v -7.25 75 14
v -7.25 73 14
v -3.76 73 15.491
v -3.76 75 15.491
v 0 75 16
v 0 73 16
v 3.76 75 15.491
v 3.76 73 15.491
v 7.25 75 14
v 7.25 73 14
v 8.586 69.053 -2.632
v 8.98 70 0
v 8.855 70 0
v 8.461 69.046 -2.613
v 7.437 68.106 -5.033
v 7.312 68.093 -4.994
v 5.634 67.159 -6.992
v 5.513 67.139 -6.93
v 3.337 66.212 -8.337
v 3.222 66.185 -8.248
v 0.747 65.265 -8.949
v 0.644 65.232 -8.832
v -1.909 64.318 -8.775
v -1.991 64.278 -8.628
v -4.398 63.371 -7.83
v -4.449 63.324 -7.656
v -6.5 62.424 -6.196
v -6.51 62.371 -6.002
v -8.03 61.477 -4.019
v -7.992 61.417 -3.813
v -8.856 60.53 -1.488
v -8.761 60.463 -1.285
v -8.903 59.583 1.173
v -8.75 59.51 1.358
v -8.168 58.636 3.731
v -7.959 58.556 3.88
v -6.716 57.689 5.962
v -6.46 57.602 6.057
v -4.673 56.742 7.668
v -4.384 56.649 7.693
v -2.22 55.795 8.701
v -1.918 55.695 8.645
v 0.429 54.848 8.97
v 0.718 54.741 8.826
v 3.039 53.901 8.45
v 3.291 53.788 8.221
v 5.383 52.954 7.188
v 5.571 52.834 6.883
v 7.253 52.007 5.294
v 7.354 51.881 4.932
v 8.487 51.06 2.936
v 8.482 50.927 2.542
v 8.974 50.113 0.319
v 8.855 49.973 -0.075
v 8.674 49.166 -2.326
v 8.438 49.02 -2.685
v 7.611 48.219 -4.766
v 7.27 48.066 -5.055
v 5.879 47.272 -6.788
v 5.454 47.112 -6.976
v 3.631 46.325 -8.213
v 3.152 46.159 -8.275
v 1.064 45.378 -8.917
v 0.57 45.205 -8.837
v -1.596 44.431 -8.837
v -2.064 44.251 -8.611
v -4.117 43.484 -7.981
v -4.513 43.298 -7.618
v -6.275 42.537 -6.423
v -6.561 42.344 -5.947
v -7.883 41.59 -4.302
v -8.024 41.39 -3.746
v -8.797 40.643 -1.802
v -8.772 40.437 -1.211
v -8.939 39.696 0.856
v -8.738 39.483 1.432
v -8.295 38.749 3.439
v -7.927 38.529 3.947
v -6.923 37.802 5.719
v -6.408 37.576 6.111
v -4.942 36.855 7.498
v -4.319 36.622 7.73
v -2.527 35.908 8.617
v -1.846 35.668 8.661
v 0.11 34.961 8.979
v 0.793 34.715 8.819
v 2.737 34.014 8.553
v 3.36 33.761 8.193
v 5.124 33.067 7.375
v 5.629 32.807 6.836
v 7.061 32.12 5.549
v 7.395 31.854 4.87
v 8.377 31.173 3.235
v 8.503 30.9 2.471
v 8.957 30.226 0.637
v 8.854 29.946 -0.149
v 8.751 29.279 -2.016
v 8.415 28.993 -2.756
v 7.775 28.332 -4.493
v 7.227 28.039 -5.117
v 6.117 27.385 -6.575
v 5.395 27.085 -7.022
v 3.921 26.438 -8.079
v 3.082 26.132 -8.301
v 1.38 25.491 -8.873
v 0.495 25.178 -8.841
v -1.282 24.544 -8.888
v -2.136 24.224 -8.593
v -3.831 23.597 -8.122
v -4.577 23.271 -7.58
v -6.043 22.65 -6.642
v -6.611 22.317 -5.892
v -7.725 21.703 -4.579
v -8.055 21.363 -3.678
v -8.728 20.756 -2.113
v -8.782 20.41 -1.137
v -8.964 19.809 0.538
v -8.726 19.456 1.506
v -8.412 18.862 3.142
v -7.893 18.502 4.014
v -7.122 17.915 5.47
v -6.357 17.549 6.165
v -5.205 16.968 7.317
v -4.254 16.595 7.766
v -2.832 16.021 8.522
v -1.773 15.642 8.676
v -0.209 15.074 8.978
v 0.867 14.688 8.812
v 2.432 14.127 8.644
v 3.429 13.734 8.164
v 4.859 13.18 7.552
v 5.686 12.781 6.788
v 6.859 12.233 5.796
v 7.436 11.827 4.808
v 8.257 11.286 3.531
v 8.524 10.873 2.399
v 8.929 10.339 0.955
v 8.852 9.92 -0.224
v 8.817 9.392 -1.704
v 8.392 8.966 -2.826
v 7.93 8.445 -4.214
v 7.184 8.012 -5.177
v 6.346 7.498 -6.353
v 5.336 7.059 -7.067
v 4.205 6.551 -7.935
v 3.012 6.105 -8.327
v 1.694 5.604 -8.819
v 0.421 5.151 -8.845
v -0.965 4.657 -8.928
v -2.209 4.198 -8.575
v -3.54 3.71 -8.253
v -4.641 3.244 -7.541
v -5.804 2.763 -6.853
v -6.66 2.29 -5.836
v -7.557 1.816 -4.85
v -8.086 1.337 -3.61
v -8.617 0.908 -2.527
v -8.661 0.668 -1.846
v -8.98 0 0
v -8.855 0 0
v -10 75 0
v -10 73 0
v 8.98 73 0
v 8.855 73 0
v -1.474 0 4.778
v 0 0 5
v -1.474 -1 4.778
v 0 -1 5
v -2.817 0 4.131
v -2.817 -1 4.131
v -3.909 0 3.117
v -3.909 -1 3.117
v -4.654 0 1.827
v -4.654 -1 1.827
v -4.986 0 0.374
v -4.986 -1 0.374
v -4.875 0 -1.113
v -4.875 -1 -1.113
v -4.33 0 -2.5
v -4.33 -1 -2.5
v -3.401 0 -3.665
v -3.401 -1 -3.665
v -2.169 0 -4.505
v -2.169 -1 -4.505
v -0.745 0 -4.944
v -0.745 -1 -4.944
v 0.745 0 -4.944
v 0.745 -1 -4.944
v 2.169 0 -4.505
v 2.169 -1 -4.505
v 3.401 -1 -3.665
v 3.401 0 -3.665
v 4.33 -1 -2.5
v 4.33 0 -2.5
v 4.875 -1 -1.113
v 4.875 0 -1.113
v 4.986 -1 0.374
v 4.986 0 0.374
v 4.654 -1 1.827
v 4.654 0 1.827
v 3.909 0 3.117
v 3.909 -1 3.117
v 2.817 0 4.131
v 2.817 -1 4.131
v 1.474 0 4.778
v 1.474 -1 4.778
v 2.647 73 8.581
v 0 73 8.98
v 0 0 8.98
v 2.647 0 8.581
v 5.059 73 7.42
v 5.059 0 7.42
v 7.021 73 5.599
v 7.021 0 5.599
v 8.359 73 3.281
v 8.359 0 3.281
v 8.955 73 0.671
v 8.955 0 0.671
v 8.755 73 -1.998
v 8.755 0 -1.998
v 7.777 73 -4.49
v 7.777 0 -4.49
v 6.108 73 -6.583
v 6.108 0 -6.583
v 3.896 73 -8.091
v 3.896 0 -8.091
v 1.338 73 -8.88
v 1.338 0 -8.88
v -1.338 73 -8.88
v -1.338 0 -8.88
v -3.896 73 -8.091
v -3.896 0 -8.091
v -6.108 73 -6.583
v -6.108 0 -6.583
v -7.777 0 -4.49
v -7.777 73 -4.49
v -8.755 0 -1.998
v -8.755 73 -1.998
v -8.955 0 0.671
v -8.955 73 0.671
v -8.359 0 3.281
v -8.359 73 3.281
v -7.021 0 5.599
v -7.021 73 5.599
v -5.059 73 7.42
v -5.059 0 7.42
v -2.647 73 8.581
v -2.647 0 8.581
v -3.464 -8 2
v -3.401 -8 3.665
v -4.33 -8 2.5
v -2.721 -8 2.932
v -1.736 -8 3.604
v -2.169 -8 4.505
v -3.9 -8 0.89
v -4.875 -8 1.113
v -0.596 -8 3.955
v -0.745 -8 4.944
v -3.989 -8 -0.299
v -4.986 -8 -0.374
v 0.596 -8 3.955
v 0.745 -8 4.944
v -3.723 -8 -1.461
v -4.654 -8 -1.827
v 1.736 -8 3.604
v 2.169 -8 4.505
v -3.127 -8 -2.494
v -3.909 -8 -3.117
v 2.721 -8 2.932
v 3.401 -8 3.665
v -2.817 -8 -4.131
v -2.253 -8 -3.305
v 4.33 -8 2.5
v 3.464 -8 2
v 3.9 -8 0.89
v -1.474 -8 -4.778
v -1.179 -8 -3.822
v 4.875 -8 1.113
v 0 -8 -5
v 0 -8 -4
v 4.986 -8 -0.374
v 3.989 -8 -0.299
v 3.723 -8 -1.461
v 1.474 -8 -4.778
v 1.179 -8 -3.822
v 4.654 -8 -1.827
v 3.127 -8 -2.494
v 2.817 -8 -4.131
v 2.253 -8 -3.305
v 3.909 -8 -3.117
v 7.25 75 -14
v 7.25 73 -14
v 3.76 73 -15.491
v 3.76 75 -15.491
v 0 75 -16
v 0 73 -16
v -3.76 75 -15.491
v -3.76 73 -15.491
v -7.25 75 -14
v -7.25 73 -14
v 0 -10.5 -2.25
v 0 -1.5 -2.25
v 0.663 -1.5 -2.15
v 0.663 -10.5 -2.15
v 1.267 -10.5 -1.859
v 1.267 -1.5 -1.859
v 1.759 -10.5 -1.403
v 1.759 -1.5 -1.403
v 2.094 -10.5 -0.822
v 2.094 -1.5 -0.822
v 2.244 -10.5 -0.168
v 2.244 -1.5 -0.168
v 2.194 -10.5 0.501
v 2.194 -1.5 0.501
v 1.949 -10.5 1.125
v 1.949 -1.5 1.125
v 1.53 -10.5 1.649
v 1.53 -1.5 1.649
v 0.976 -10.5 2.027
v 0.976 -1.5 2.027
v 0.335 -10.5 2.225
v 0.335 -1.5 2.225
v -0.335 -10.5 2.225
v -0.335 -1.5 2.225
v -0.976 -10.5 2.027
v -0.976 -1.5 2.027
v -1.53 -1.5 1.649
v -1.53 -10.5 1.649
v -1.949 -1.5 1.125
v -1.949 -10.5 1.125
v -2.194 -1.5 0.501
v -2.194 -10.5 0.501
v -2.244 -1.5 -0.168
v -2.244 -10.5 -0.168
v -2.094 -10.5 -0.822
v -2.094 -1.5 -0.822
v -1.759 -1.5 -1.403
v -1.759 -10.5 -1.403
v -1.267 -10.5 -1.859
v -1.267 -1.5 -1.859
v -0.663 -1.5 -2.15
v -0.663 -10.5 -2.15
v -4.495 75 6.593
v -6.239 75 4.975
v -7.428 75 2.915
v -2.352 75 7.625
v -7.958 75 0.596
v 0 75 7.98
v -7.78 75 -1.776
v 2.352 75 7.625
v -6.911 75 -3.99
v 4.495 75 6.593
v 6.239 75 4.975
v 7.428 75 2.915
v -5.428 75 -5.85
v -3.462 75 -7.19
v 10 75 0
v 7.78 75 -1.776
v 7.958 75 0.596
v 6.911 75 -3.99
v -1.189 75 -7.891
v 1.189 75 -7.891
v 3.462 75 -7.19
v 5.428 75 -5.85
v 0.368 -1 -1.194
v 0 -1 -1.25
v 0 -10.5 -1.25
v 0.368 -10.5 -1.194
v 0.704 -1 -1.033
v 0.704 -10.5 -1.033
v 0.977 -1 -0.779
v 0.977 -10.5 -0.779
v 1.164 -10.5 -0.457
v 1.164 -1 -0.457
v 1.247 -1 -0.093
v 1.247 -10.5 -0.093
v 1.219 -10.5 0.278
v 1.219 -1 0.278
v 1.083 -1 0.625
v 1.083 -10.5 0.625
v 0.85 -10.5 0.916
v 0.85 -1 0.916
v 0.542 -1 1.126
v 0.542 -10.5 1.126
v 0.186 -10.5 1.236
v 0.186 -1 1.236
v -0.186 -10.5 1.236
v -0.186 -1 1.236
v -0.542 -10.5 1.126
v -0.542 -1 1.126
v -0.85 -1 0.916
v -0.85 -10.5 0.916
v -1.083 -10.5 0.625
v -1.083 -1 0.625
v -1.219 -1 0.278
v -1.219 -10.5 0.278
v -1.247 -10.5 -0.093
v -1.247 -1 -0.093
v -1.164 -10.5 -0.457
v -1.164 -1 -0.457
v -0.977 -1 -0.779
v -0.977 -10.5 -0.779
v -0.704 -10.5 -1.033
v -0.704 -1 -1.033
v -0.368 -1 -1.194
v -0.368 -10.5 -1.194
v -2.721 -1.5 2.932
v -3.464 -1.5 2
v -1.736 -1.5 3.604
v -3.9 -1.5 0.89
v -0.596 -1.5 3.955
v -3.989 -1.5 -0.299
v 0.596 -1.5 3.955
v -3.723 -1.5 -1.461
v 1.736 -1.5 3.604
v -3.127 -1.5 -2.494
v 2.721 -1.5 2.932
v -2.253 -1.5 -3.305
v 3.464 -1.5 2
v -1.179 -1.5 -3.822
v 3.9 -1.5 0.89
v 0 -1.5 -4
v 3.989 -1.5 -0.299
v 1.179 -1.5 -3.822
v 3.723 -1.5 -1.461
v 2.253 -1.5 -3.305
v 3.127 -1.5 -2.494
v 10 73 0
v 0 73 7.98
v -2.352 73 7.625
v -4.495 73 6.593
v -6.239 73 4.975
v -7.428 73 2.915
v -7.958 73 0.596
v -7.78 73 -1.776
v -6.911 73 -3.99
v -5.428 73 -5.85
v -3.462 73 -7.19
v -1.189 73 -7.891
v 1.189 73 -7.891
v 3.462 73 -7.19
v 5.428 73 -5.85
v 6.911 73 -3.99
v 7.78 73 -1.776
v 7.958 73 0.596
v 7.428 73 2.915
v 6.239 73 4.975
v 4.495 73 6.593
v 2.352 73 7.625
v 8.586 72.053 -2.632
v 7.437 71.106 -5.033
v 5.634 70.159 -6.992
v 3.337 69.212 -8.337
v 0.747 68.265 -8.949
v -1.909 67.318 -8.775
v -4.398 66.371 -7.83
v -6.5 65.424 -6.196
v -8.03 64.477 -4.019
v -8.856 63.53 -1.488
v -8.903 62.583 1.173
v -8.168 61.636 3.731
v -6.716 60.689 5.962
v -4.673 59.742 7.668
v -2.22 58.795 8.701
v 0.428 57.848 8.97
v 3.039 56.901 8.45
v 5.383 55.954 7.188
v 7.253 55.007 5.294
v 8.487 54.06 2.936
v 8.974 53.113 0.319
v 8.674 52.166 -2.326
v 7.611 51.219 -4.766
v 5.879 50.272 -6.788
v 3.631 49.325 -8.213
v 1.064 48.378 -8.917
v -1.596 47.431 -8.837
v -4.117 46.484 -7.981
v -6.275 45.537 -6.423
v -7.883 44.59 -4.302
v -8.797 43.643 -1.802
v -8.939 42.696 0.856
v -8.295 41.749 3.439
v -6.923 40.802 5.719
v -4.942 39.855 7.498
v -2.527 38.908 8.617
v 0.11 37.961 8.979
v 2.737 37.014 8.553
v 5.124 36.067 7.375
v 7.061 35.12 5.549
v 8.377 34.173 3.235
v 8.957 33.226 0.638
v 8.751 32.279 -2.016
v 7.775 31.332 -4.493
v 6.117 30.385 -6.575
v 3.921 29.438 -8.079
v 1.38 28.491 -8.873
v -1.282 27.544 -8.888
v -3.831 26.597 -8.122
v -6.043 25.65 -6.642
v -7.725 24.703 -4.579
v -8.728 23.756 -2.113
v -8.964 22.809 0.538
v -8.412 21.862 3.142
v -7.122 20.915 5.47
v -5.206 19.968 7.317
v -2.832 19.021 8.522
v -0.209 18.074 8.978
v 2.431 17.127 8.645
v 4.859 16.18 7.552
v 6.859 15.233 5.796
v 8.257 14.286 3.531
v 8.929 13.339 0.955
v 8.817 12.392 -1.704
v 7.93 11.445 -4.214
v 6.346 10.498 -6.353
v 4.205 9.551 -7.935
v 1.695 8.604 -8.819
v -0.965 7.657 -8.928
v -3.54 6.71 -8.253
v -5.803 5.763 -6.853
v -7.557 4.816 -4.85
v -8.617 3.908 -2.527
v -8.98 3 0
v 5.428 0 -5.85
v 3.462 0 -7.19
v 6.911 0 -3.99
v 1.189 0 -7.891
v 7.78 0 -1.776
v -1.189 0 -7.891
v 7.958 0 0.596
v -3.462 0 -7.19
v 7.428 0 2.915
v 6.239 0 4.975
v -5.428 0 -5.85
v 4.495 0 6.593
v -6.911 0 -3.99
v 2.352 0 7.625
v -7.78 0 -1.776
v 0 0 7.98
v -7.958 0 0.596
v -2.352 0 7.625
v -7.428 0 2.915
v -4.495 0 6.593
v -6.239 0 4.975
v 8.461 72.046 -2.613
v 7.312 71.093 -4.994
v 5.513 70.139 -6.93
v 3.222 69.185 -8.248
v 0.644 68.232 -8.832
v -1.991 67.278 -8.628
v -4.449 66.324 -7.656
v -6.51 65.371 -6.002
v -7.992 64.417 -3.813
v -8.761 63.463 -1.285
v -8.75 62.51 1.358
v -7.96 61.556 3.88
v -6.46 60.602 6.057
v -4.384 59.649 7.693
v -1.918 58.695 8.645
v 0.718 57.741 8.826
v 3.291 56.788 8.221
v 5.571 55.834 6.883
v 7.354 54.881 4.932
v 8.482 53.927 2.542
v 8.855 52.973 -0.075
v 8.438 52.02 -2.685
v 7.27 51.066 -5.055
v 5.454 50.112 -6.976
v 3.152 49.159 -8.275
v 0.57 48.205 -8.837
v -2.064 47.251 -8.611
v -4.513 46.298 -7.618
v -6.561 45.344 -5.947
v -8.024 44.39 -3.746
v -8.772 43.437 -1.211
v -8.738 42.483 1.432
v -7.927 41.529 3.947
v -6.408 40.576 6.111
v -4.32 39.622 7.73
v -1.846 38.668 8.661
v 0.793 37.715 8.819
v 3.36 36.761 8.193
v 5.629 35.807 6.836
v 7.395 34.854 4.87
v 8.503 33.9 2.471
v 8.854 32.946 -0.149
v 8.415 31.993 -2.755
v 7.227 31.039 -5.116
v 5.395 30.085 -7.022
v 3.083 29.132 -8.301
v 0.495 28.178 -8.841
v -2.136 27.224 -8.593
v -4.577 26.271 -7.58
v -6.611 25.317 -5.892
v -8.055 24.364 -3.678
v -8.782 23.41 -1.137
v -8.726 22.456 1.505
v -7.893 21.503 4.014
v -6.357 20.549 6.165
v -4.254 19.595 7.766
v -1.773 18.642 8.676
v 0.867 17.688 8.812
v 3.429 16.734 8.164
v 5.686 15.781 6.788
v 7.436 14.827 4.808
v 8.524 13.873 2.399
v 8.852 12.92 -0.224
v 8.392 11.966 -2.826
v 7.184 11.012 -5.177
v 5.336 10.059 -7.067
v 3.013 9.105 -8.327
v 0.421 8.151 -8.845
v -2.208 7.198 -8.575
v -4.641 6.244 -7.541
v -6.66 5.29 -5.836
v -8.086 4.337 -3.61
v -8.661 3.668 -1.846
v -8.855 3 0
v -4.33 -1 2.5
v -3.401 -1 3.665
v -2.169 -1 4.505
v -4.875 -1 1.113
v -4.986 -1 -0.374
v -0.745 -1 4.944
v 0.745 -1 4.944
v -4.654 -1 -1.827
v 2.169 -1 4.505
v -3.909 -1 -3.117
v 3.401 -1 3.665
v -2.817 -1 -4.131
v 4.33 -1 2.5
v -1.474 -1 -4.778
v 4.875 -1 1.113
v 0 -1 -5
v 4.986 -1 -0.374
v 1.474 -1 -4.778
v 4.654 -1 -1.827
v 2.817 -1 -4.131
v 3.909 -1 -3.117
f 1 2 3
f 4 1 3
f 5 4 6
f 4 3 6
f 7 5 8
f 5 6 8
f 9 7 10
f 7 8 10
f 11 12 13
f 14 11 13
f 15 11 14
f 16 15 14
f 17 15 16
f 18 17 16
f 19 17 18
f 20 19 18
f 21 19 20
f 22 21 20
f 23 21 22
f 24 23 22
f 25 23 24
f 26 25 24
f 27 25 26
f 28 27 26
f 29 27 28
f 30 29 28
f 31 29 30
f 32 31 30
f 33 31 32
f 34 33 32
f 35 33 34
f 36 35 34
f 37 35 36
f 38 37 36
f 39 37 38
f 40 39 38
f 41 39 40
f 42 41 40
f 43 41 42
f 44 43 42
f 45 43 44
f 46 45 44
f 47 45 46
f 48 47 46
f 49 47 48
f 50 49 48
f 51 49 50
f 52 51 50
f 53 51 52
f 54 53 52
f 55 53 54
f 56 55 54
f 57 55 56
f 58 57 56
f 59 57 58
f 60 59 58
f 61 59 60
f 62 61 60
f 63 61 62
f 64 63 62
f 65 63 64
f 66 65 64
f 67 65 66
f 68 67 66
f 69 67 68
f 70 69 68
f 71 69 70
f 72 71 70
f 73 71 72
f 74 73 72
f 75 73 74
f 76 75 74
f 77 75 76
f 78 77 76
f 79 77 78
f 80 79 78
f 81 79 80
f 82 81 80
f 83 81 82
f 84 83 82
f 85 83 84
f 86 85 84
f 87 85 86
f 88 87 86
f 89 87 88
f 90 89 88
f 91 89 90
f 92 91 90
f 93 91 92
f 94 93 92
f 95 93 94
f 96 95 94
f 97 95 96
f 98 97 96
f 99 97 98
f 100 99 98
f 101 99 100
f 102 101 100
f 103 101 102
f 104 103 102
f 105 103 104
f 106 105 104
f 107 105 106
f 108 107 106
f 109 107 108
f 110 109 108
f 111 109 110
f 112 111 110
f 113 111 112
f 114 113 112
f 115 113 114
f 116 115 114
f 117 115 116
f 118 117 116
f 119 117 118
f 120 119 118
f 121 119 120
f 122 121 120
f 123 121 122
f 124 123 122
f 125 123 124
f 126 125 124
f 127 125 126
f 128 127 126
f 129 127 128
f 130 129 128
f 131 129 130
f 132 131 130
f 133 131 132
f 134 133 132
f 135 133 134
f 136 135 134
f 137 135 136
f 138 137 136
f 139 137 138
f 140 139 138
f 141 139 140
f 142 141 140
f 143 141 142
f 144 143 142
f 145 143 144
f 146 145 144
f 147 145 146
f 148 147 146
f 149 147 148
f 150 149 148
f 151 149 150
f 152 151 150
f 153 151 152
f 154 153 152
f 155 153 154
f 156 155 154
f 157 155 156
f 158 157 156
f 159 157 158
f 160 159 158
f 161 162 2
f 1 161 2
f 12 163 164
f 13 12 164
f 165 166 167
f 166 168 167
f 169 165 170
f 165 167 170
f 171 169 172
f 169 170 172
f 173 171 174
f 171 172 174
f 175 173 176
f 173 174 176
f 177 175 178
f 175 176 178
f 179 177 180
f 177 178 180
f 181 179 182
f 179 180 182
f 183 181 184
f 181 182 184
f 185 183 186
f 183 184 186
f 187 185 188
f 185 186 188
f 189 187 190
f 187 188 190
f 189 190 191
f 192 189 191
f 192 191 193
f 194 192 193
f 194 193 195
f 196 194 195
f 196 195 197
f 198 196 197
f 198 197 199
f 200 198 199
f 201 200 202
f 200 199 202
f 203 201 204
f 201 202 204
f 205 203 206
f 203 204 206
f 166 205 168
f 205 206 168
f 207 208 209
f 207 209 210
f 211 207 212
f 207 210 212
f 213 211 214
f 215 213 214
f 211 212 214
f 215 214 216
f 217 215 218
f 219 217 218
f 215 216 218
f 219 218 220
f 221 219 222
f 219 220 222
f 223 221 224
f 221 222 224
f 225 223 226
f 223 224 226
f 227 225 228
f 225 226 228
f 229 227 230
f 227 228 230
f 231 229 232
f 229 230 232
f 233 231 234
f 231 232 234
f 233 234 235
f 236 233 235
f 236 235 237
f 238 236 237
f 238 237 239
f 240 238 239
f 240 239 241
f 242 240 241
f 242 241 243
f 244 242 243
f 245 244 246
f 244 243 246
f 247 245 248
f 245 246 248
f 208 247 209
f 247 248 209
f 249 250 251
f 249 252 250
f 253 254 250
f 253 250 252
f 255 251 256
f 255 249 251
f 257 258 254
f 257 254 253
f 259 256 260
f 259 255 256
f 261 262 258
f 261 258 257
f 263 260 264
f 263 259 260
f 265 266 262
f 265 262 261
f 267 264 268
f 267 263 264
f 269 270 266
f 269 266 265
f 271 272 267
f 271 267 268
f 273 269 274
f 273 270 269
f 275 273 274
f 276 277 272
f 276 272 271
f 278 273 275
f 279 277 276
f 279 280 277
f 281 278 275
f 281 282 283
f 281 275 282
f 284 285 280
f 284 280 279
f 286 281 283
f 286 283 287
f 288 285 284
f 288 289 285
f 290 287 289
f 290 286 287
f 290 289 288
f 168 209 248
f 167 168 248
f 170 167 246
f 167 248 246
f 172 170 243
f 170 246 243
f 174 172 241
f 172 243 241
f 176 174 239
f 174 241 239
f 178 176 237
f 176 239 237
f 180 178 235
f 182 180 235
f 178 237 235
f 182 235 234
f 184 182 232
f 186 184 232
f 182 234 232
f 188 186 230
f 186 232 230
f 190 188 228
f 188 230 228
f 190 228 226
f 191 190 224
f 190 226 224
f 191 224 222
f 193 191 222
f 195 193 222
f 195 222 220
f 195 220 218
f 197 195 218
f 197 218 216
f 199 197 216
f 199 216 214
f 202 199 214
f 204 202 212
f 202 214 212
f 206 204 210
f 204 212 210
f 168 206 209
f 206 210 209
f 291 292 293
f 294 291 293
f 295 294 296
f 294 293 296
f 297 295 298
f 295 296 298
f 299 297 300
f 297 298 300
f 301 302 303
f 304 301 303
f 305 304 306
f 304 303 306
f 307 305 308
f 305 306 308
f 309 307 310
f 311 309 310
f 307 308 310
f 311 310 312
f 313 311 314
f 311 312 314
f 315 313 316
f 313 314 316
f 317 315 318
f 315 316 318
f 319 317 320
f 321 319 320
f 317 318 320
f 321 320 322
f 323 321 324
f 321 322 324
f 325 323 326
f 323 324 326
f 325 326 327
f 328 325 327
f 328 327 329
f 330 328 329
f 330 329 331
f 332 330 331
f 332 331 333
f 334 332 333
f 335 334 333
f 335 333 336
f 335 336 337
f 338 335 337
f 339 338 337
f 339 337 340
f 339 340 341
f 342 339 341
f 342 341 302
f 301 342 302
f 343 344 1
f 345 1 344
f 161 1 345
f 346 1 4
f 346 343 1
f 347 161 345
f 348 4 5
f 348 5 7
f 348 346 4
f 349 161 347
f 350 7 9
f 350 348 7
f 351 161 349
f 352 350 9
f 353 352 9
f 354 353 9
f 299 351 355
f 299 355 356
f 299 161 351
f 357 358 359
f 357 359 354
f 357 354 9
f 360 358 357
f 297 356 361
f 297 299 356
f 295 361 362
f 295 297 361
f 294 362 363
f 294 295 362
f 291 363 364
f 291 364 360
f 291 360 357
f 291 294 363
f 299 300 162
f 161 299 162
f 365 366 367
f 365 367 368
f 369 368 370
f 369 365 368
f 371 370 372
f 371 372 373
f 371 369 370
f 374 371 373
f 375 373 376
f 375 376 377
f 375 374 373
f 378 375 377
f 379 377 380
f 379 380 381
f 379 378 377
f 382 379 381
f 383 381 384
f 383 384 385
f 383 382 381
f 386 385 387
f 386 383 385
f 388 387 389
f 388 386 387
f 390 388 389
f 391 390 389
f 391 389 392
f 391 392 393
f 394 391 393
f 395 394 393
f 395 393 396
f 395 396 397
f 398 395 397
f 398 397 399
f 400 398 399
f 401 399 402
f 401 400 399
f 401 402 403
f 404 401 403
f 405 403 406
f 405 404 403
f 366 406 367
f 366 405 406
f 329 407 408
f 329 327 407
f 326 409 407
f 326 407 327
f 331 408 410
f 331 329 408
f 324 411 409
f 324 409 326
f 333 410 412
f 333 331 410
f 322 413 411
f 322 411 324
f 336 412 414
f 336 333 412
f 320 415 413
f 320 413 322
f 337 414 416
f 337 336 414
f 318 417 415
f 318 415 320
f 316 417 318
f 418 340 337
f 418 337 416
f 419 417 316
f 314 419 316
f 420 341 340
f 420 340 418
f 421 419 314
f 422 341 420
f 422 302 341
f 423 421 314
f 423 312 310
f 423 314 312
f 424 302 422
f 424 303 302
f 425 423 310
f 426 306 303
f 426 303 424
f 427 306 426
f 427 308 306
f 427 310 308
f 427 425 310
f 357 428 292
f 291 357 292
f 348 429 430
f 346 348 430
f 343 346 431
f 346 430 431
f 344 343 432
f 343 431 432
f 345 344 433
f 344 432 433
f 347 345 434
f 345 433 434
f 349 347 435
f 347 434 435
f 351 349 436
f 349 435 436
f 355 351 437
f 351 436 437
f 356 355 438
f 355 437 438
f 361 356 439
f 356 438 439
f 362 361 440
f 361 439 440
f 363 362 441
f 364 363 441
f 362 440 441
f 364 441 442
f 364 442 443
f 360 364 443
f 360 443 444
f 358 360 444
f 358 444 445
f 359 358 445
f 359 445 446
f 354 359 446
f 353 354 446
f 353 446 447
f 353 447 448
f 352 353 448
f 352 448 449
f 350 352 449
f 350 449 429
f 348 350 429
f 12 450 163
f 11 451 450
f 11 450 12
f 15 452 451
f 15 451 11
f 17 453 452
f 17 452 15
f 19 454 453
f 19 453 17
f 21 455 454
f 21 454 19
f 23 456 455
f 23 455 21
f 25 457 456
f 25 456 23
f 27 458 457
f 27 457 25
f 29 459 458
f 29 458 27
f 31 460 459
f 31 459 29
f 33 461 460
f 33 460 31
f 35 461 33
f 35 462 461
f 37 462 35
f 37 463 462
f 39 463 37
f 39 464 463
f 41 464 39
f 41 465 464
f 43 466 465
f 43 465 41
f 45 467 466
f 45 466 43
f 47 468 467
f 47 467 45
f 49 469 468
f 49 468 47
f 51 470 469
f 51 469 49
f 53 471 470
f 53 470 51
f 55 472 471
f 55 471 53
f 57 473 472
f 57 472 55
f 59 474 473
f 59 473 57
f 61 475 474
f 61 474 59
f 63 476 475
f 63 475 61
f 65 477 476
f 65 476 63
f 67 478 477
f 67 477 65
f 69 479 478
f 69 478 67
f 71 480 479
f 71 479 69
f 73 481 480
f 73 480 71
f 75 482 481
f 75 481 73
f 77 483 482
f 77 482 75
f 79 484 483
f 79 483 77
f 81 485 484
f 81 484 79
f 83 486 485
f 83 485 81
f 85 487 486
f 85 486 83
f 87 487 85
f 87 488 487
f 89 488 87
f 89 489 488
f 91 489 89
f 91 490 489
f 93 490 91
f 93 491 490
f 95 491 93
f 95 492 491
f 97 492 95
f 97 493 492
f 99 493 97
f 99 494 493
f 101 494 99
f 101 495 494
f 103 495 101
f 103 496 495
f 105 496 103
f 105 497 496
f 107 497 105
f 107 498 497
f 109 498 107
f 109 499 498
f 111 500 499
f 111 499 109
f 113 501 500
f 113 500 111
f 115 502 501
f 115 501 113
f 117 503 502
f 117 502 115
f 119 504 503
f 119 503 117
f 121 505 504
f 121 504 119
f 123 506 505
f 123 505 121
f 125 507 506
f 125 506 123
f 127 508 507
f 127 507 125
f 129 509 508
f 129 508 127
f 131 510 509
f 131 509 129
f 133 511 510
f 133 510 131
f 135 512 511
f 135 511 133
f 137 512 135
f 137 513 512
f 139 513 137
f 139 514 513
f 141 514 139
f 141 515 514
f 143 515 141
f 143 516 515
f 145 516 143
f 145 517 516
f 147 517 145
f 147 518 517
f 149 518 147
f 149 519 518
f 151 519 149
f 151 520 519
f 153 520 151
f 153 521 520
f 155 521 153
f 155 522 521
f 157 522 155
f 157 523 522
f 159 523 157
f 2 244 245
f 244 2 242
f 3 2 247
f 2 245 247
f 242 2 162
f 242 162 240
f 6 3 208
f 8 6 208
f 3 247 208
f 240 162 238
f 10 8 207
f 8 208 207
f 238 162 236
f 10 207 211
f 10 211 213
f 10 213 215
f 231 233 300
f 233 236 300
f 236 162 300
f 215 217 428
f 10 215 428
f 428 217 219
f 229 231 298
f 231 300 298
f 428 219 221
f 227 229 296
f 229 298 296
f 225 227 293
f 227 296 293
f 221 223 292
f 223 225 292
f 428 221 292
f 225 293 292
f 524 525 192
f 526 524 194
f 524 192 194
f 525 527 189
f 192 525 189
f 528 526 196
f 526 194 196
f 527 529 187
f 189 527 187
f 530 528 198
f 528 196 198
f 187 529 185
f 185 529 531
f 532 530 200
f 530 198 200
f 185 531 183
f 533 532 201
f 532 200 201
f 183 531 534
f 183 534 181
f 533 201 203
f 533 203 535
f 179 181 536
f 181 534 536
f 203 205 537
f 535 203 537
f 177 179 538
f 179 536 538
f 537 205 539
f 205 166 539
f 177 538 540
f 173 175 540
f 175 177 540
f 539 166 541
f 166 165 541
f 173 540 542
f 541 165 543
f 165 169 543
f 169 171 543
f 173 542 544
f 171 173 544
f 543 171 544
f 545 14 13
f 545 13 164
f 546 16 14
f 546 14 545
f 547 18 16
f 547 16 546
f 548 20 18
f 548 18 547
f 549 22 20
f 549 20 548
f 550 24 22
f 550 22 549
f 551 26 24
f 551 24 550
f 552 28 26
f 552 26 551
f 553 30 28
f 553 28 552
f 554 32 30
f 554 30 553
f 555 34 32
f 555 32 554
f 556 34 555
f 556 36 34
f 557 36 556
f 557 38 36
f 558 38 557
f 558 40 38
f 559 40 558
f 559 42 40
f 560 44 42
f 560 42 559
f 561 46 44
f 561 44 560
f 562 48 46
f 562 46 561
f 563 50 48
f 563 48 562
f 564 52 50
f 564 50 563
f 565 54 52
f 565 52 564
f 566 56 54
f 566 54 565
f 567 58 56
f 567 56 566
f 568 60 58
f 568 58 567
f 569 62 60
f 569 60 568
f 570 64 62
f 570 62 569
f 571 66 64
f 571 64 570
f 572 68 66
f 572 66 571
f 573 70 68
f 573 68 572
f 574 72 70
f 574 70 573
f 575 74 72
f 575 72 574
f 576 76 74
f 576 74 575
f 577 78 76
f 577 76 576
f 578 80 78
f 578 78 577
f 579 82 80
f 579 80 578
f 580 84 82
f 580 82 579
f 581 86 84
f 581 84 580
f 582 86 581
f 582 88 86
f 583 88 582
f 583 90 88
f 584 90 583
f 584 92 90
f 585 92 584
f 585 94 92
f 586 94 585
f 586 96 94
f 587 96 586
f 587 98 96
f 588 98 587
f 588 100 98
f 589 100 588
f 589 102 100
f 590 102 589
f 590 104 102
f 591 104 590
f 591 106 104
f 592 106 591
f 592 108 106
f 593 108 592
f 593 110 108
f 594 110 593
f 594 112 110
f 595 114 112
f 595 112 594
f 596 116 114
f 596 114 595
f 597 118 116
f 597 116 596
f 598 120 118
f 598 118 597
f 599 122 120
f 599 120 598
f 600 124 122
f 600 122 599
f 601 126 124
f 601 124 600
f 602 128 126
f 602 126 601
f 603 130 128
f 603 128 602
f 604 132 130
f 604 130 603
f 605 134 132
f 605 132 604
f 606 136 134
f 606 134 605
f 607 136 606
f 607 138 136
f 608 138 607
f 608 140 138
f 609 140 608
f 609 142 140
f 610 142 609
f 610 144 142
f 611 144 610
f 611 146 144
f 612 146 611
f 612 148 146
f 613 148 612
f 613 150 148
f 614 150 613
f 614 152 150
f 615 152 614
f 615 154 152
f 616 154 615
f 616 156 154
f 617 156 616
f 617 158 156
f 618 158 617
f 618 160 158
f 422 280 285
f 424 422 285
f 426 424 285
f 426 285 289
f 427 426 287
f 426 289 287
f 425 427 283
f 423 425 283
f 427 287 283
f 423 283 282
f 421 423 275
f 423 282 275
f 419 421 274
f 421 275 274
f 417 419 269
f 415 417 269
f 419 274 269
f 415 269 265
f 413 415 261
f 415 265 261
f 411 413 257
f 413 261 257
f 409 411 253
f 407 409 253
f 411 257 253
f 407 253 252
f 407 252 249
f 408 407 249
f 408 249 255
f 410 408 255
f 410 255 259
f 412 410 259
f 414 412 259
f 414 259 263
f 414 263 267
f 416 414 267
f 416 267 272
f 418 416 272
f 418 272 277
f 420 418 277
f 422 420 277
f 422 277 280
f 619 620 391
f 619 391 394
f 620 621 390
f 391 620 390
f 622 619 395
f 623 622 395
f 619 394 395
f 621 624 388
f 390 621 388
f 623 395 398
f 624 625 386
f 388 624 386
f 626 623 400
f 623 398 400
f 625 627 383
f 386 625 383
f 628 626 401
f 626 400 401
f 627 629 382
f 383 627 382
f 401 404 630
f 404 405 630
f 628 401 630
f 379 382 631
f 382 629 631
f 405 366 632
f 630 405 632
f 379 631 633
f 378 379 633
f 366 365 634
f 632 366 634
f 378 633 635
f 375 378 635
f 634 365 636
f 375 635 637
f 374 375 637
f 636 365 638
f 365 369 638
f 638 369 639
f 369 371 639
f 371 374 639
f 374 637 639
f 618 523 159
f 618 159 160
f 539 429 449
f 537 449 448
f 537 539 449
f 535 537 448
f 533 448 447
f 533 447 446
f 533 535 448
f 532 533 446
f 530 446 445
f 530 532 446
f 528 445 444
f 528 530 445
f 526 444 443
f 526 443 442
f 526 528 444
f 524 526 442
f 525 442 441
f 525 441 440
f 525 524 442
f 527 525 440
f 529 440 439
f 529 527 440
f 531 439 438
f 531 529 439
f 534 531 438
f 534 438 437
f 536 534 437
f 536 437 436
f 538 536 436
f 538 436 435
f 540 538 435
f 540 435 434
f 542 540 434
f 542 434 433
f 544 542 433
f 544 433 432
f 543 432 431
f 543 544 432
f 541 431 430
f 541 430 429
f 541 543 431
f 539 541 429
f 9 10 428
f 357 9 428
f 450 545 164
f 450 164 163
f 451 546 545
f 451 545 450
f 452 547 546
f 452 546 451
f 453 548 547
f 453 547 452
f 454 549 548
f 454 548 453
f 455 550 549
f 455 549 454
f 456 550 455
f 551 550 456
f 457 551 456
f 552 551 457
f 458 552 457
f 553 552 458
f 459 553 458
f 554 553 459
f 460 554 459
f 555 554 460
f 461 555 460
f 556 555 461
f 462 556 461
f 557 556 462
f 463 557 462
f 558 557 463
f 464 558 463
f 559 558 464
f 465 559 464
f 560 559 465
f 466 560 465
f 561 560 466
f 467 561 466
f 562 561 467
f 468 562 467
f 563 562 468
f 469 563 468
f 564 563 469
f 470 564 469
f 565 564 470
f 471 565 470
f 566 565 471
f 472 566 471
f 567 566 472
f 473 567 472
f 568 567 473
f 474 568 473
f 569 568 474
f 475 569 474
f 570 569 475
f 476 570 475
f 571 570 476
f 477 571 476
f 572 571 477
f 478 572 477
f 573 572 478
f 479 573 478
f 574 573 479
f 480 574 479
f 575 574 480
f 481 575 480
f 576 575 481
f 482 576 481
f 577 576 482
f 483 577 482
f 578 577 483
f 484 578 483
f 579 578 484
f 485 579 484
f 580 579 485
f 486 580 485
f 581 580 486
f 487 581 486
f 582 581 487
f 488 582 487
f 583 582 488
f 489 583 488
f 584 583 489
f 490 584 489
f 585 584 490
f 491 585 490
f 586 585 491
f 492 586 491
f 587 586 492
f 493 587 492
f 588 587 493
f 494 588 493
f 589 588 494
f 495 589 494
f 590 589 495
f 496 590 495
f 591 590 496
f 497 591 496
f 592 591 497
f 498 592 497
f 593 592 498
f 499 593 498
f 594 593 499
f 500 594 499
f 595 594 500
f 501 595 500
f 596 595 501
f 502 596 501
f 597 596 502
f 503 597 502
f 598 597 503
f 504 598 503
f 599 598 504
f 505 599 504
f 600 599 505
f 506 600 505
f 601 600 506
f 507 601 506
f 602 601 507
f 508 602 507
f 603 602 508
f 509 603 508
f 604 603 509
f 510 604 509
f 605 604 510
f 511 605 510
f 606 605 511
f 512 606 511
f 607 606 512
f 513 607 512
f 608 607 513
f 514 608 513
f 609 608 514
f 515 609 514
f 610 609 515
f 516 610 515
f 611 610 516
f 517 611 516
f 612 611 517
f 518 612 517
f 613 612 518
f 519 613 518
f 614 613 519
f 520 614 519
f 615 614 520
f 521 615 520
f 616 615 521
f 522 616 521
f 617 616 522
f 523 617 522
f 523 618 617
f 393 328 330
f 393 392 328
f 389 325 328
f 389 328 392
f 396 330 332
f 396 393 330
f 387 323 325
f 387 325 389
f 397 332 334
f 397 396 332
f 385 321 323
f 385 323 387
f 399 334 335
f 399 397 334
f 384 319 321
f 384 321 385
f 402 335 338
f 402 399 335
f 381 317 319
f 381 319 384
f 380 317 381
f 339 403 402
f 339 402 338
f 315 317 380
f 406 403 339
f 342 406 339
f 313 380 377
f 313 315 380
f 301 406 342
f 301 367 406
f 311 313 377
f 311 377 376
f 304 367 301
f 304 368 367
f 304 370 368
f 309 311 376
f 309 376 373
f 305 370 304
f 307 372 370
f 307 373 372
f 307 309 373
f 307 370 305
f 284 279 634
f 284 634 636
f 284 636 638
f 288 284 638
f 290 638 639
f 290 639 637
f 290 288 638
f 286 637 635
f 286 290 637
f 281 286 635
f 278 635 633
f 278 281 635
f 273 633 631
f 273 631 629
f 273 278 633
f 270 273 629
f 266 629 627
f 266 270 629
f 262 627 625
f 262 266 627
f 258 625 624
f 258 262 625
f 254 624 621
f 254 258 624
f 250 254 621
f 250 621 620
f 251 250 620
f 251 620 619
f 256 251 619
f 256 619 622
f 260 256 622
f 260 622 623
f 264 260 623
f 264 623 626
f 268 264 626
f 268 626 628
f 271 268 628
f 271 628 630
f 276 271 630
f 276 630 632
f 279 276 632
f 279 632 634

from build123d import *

# Parameters (mm, degrees)
SKETCH2_R           = 8.98
SKETCH2_R_2         = 7.98
BOSS_EXTRUDE1_DEPTH = 73
BOSS_EXTRUDE2_DEPTH = 2
SKETCH6_R           = 5
SKETCH6_R_2         = 2.25
BOSS_EXTRUDE3_DEPTH = 0.5
BOSS_EXTRUDE4_START = 7
SKETCH7_R           = 5
SKETCH7_R_2         = 4
BOSS_EXTRUDE4_DEPTH = 7
SKETCH8_R           = 2.25
SKETCH8_R_2         = 1.25
BOSS_EXTRUDE5_DEPTH = 9.5
SKETCH9_R           = 7.98
CUT_EXTRUDE2_DEPTH  = 9.5
SWEEP1_PITCH        = 20
SWEEP1_HEIGHT       = 70
SWEEP1_RADIUS       = 8.98
SWEEP1_START_ANGLE  = 90
SKETCH10_W          = 0.125
SKETCH10_H          = 3


with BuildPart() as part:
    # Sketch2 → Boss-Extrude1 (new body)
    with BuildSketch(Plane(origin=(0, 0, 0), x_dir=(1, 0, 0), z_dir=(0, 1, 0))):
        Circle(SKETCH2_R)
        Circle(SKETCH2_R_2, mode=Mode.SUBTRACT)
    extrude(amount=BOSS_EXTRUDE1_DEPTH)

    # Sketch3 → Boss-Extrude2 (add)
    with BuildSketch(Plane(origin=(0, 73, 0), x_dir=(1, 0, 0), z_dir=(0, 1, 0))):
        with BuildLine():
            Line((-7.25, 14), (-10, 0))
            Line((-10, 0), (-7.25, -14))
            ThreePointArc((-7.25, -14), (0, -16), (7.25, -14))
            Line((7.25, -14), (10, 0))
            Line((10, 0), (7.25, 14))
            ThreePointArc((7.25, 14), (0, 16), (-7.25, 14))
        make_face()
    extrude(amount=BOSS_EXTRUDE2_DEPTH)

    # Sketch4 → Revolve1 (revolve)
    with BuildSketch(Plane(origin=(0, 0, 0), x_dir=(0, 0, -1), z_dir=(1, 0, 0))):
        Polygon((8.98, 0), (5, 0), (5, -1), align=None)
    revolve(axis=Axis((0, 0, 0), (0, -1, 0)))

    # Sketch9 → Cut-Extrude2 (cut)
    with BuildSketch(Plane.XZ.offset(-73)):
        Circle(SKETCH9_R)
    extrude(amount=-CUT_EXTRUDE2_DEPTH, mode=Mode.SUBTRACT)


with BuildPart() as body_2:
    # Sketch6 → Boss-Extrude3 (new body)
    with BuildSketch(Plane(origin=(0, -1, 0), x_dir=(-1, 0, 0), z_dir=(0, -1, 0))):
        Circle(SKETCH6_R)
        Circle(SKETCH6_R_2, mode=Mode.SUBTRACT)
    extrude(amount=BOSS_EXTRUDE3_DEPTH)

    # Sketch7 → Boss-Extrude4 (add)
    with BuildSketch(Plane(origin=(0, -1, 0), x_dir=(-1, 0, 0), z_dir=(0, -1, 0)).offset(BOSS_EXTRUDE4_START)):
        Circle(SKETCH7_R)
        Circle(SKETCH7_R_2, mode=Mode.SUBTRACT)
    extrude(amount=-BOSS_EXTRUDE4_DEPTH)

    # Sketch8 → Boss-Extrude5 (add)
    with BuildSketch(Plane(origin=(0, -1, 0), x_dir=(-1, 0, 0), z_dir=(0, -1, 0))):
        Circle(SKETCH8_R)
        Circle(SKETCH8_R_2, mode=Mode.SUBTRACT)
    extrude(amount=BOSS_EXTRUDE5_DEPTH)


with BuildPart() as body_3:
    # Sweep1: sweep along a helix
    with BuildLine() as sweep1_path:
        add(Helix(SWEEP1_PITCH, SWEEP1_HEIGHT, SWEEP1_RADIUS, center=(0, 71.5, 0), direction=(0, -1, 0), lefthand=True, mode=Mode.PRIVATE).rotate(Axis((0, 71.5, 0), (0, -1, 0)), SWEEP1_START_ANGLE))
    # Sketch10 → Sweep1 (sweep)
    with BuildSketch(Plane.XY):
        with Locations((-8.9175, 1.5)):
            Rectangle(SKETCH10_W, SKETCH10_H)
    sweep(path=sweep1_path.line, is_frenet=True)


solid = Compound([part.part, body_2.part, body_3.part])
